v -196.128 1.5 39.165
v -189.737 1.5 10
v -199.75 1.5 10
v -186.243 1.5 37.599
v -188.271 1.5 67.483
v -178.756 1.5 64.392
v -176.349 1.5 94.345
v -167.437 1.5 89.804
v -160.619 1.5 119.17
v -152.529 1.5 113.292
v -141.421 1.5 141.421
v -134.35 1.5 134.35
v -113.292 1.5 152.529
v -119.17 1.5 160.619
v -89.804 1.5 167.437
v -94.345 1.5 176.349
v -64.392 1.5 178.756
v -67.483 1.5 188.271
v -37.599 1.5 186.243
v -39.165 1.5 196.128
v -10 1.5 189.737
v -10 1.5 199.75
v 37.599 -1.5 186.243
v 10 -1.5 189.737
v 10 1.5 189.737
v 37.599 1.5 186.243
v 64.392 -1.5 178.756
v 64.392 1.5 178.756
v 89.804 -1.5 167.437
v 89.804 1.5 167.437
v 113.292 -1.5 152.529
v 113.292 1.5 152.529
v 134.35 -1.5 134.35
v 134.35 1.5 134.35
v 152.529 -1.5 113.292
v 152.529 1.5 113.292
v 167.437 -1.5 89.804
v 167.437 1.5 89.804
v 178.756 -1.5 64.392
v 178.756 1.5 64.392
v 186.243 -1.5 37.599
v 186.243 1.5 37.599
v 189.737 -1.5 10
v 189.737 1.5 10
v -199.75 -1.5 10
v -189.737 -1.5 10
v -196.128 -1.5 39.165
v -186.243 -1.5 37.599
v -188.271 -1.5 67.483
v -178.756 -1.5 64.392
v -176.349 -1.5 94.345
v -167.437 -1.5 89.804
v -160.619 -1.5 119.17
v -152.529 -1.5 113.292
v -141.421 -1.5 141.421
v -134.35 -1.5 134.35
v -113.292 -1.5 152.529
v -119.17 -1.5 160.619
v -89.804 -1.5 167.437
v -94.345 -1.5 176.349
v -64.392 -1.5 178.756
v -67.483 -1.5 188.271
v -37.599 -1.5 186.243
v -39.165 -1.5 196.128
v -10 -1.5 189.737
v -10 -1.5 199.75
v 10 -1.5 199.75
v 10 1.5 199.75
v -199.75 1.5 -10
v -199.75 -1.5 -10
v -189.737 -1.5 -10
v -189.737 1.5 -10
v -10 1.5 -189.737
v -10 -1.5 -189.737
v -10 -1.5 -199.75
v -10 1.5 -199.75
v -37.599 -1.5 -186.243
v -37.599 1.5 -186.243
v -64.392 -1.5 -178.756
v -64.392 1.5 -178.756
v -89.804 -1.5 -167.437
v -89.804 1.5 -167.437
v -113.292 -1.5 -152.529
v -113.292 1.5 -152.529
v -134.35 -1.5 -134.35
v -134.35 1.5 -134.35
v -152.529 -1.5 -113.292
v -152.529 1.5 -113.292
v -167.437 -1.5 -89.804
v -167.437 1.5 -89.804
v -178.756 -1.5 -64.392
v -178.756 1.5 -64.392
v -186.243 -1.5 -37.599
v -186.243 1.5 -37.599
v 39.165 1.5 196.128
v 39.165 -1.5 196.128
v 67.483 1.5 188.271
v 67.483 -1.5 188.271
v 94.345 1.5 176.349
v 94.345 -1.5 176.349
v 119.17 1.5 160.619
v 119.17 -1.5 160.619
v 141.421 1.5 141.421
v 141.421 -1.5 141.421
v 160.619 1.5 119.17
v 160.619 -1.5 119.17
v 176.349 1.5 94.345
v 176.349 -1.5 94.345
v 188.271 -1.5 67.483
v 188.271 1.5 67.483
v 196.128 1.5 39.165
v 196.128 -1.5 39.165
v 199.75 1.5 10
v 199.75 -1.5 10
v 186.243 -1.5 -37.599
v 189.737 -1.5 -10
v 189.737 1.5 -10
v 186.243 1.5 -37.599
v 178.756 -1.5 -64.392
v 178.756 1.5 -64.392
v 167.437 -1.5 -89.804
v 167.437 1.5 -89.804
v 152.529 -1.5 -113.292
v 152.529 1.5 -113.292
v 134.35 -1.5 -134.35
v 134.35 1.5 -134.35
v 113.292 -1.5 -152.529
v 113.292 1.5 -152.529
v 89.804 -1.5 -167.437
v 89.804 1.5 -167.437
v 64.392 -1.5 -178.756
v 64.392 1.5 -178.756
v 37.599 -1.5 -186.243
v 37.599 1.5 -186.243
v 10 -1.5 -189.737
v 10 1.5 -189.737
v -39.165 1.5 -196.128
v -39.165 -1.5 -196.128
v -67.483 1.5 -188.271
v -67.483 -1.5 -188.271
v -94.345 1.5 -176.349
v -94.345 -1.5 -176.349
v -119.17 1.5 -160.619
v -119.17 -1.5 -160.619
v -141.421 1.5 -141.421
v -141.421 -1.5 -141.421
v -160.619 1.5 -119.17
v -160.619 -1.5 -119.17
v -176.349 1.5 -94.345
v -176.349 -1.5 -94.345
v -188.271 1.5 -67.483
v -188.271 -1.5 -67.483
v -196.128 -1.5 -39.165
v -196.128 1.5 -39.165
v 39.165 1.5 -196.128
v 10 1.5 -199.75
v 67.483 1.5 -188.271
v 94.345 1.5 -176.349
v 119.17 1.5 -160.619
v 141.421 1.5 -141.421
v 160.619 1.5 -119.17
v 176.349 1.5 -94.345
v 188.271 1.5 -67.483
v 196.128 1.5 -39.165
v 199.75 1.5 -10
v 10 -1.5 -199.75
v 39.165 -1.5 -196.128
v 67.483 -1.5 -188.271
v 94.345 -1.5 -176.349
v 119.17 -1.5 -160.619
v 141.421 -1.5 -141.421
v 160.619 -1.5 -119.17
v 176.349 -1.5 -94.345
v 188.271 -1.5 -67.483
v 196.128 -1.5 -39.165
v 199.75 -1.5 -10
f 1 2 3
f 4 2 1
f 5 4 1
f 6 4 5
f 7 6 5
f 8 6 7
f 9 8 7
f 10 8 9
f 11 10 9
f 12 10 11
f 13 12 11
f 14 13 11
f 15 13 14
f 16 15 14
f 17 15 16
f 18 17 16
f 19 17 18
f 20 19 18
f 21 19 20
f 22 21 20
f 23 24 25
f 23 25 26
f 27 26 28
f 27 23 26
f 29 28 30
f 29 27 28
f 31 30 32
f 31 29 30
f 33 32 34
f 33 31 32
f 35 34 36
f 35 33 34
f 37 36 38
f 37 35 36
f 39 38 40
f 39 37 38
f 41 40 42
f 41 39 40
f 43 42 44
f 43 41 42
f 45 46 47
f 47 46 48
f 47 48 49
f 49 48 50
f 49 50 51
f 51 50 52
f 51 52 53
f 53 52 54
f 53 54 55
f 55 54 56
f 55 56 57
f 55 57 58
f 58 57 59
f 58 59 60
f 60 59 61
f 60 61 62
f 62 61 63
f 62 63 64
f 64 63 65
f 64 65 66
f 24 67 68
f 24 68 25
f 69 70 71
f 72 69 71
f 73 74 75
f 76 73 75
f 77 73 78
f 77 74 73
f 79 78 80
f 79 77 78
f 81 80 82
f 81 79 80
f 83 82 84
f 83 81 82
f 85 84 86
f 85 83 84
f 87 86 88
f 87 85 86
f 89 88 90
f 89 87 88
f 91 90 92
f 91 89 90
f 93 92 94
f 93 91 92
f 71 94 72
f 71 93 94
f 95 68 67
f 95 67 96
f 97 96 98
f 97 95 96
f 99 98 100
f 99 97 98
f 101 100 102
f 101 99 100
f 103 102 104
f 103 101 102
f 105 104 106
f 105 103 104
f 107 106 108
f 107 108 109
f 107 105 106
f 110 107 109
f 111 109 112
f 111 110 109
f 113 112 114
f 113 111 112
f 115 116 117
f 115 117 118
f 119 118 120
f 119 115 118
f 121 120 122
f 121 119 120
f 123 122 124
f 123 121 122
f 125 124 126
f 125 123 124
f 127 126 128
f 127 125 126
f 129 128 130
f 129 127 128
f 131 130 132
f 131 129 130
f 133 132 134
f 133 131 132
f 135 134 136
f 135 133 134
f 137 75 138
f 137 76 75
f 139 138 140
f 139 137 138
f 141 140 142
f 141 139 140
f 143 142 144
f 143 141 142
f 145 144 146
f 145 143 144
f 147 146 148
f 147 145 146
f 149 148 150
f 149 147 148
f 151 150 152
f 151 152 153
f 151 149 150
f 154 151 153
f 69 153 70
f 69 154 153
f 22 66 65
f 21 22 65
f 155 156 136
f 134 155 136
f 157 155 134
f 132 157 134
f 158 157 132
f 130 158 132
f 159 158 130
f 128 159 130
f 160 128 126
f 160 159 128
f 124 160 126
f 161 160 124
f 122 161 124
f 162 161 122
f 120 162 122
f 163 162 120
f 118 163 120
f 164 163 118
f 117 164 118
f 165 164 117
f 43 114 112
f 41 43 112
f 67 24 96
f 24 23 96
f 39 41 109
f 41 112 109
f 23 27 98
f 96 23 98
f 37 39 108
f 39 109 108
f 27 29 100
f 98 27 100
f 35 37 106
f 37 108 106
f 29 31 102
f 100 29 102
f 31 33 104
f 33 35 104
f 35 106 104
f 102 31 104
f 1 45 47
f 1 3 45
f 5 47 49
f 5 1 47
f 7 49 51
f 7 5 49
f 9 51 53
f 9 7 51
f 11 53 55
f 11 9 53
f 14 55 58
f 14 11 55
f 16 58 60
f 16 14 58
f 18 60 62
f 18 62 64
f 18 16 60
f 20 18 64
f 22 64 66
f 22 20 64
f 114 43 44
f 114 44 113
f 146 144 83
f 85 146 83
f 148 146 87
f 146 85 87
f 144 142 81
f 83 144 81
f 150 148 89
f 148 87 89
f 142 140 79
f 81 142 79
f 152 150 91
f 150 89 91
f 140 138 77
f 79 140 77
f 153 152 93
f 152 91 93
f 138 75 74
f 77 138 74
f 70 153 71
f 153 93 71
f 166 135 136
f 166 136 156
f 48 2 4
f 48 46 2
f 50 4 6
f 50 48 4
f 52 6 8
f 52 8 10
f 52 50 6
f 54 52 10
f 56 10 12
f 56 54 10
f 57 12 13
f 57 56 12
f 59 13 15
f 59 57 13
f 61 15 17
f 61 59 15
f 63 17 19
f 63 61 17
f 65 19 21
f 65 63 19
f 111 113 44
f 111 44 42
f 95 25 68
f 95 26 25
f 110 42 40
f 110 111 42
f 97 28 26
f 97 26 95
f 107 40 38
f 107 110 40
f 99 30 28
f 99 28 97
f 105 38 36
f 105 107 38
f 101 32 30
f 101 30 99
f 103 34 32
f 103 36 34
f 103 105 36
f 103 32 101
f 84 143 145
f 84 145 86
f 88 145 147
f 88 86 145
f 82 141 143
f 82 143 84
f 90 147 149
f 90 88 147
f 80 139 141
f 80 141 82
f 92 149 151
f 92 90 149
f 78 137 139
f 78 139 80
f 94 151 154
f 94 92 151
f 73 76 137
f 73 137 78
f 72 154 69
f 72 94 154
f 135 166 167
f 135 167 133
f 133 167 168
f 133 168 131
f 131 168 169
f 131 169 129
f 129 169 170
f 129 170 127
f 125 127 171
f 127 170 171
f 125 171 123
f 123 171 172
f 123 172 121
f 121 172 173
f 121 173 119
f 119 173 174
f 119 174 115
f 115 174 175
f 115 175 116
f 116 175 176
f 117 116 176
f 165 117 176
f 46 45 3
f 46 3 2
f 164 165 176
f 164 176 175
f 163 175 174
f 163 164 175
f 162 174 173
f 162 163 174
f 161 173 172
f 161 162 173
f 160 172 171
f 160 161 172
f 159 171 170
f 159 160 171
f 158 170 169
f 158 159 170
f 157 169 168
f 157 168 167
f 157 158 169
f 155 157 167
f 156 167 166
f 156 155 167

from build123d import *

# Parameters (mm, degrees)
SKETCH1_R            = 200
SKETCH1_R_2          = 190
BOSS_EXTRUDE1_DEPTH  = 1.5
QUADRUPLE_DEPTH      = 283.846689922
QUADRUPLE_DEPTH_BACK = 283.846689922
SKETCH4_W            = 20
SKETCH4_H            = 400
SKETCH4_W_2          = 400
SKETCH4_H_2          = 20


with BuildPart() as part:
    # Sketch1 → Boss-Extrude1 (new, symmetric)
    with BuildSketch(Plane(origin=(0, 0, 0), x_dir=(1, 0, 0), z_dir=(0, 1, 0))):
        Circle(SKETCH1_R)
        Circle(SKETCH1_R_2, mode=Mode.SUBTRACT)
    extrude(amount=BOSS_EXTRUDE1_DEPTH, both=True)

    # Sketch4 → quadruple (cut, two sides: drawn at the far end of the back side and taken through both)
    with BuildSketch(Plane(origin=(0, 0, 0), x_dir=(1, 0, 0), z_dir=(0, 1, 0)).offset(-QUADRUPLE_DEPTH_BACK)):
        Rectangle(SKETCH4_W, SKETCH4_H)
        Rectangle(SKETCH4_W_2, SKETCH4_H_2)
    extrude(amount=QUADRUPLE_DEPTH + QUADRUPLE_DEPTH_BACK, mode=Mode.SUBTRACT)


with BuildPart() as quadruple_piece_1:
    # of the separate pieces the step leaves, piece 1, a body of its own (quadruple_pieces)
    add(part.part.solids().sort_by_distance((199.749843554, -1.5, -10))[0])


with BuildPart() as quadruple_piece_2:
    # of the separate pieces the step leaves, piece 2, a body of its own (quadruple_pieces)
    add(part.part.solids().sort_by_distance((-10, 1.5, -199.749843554))[0])


with BuildPart() as quadruple_piece_3:
    # of the separate pieces the step leaves, piece 3, a body of its own (quadruple_pieces)
    add(part.part.solids().sort_by_distance((-199.749843554, 1.5, 10))[0])


with BuildPart() as quadruple_piece_4:
    # of the separate pieces the step leaves, piece 4, a body of its own (quadruple_pieces)
    add(part.part.solids().sort_by_distance((10, -1.5, 199.749843554))[0])


solid = Compound([quadruple_piece_1.part, quadruple_piece_2.part, quadruple_piece_3.part, quadruple_piece_4.part])
